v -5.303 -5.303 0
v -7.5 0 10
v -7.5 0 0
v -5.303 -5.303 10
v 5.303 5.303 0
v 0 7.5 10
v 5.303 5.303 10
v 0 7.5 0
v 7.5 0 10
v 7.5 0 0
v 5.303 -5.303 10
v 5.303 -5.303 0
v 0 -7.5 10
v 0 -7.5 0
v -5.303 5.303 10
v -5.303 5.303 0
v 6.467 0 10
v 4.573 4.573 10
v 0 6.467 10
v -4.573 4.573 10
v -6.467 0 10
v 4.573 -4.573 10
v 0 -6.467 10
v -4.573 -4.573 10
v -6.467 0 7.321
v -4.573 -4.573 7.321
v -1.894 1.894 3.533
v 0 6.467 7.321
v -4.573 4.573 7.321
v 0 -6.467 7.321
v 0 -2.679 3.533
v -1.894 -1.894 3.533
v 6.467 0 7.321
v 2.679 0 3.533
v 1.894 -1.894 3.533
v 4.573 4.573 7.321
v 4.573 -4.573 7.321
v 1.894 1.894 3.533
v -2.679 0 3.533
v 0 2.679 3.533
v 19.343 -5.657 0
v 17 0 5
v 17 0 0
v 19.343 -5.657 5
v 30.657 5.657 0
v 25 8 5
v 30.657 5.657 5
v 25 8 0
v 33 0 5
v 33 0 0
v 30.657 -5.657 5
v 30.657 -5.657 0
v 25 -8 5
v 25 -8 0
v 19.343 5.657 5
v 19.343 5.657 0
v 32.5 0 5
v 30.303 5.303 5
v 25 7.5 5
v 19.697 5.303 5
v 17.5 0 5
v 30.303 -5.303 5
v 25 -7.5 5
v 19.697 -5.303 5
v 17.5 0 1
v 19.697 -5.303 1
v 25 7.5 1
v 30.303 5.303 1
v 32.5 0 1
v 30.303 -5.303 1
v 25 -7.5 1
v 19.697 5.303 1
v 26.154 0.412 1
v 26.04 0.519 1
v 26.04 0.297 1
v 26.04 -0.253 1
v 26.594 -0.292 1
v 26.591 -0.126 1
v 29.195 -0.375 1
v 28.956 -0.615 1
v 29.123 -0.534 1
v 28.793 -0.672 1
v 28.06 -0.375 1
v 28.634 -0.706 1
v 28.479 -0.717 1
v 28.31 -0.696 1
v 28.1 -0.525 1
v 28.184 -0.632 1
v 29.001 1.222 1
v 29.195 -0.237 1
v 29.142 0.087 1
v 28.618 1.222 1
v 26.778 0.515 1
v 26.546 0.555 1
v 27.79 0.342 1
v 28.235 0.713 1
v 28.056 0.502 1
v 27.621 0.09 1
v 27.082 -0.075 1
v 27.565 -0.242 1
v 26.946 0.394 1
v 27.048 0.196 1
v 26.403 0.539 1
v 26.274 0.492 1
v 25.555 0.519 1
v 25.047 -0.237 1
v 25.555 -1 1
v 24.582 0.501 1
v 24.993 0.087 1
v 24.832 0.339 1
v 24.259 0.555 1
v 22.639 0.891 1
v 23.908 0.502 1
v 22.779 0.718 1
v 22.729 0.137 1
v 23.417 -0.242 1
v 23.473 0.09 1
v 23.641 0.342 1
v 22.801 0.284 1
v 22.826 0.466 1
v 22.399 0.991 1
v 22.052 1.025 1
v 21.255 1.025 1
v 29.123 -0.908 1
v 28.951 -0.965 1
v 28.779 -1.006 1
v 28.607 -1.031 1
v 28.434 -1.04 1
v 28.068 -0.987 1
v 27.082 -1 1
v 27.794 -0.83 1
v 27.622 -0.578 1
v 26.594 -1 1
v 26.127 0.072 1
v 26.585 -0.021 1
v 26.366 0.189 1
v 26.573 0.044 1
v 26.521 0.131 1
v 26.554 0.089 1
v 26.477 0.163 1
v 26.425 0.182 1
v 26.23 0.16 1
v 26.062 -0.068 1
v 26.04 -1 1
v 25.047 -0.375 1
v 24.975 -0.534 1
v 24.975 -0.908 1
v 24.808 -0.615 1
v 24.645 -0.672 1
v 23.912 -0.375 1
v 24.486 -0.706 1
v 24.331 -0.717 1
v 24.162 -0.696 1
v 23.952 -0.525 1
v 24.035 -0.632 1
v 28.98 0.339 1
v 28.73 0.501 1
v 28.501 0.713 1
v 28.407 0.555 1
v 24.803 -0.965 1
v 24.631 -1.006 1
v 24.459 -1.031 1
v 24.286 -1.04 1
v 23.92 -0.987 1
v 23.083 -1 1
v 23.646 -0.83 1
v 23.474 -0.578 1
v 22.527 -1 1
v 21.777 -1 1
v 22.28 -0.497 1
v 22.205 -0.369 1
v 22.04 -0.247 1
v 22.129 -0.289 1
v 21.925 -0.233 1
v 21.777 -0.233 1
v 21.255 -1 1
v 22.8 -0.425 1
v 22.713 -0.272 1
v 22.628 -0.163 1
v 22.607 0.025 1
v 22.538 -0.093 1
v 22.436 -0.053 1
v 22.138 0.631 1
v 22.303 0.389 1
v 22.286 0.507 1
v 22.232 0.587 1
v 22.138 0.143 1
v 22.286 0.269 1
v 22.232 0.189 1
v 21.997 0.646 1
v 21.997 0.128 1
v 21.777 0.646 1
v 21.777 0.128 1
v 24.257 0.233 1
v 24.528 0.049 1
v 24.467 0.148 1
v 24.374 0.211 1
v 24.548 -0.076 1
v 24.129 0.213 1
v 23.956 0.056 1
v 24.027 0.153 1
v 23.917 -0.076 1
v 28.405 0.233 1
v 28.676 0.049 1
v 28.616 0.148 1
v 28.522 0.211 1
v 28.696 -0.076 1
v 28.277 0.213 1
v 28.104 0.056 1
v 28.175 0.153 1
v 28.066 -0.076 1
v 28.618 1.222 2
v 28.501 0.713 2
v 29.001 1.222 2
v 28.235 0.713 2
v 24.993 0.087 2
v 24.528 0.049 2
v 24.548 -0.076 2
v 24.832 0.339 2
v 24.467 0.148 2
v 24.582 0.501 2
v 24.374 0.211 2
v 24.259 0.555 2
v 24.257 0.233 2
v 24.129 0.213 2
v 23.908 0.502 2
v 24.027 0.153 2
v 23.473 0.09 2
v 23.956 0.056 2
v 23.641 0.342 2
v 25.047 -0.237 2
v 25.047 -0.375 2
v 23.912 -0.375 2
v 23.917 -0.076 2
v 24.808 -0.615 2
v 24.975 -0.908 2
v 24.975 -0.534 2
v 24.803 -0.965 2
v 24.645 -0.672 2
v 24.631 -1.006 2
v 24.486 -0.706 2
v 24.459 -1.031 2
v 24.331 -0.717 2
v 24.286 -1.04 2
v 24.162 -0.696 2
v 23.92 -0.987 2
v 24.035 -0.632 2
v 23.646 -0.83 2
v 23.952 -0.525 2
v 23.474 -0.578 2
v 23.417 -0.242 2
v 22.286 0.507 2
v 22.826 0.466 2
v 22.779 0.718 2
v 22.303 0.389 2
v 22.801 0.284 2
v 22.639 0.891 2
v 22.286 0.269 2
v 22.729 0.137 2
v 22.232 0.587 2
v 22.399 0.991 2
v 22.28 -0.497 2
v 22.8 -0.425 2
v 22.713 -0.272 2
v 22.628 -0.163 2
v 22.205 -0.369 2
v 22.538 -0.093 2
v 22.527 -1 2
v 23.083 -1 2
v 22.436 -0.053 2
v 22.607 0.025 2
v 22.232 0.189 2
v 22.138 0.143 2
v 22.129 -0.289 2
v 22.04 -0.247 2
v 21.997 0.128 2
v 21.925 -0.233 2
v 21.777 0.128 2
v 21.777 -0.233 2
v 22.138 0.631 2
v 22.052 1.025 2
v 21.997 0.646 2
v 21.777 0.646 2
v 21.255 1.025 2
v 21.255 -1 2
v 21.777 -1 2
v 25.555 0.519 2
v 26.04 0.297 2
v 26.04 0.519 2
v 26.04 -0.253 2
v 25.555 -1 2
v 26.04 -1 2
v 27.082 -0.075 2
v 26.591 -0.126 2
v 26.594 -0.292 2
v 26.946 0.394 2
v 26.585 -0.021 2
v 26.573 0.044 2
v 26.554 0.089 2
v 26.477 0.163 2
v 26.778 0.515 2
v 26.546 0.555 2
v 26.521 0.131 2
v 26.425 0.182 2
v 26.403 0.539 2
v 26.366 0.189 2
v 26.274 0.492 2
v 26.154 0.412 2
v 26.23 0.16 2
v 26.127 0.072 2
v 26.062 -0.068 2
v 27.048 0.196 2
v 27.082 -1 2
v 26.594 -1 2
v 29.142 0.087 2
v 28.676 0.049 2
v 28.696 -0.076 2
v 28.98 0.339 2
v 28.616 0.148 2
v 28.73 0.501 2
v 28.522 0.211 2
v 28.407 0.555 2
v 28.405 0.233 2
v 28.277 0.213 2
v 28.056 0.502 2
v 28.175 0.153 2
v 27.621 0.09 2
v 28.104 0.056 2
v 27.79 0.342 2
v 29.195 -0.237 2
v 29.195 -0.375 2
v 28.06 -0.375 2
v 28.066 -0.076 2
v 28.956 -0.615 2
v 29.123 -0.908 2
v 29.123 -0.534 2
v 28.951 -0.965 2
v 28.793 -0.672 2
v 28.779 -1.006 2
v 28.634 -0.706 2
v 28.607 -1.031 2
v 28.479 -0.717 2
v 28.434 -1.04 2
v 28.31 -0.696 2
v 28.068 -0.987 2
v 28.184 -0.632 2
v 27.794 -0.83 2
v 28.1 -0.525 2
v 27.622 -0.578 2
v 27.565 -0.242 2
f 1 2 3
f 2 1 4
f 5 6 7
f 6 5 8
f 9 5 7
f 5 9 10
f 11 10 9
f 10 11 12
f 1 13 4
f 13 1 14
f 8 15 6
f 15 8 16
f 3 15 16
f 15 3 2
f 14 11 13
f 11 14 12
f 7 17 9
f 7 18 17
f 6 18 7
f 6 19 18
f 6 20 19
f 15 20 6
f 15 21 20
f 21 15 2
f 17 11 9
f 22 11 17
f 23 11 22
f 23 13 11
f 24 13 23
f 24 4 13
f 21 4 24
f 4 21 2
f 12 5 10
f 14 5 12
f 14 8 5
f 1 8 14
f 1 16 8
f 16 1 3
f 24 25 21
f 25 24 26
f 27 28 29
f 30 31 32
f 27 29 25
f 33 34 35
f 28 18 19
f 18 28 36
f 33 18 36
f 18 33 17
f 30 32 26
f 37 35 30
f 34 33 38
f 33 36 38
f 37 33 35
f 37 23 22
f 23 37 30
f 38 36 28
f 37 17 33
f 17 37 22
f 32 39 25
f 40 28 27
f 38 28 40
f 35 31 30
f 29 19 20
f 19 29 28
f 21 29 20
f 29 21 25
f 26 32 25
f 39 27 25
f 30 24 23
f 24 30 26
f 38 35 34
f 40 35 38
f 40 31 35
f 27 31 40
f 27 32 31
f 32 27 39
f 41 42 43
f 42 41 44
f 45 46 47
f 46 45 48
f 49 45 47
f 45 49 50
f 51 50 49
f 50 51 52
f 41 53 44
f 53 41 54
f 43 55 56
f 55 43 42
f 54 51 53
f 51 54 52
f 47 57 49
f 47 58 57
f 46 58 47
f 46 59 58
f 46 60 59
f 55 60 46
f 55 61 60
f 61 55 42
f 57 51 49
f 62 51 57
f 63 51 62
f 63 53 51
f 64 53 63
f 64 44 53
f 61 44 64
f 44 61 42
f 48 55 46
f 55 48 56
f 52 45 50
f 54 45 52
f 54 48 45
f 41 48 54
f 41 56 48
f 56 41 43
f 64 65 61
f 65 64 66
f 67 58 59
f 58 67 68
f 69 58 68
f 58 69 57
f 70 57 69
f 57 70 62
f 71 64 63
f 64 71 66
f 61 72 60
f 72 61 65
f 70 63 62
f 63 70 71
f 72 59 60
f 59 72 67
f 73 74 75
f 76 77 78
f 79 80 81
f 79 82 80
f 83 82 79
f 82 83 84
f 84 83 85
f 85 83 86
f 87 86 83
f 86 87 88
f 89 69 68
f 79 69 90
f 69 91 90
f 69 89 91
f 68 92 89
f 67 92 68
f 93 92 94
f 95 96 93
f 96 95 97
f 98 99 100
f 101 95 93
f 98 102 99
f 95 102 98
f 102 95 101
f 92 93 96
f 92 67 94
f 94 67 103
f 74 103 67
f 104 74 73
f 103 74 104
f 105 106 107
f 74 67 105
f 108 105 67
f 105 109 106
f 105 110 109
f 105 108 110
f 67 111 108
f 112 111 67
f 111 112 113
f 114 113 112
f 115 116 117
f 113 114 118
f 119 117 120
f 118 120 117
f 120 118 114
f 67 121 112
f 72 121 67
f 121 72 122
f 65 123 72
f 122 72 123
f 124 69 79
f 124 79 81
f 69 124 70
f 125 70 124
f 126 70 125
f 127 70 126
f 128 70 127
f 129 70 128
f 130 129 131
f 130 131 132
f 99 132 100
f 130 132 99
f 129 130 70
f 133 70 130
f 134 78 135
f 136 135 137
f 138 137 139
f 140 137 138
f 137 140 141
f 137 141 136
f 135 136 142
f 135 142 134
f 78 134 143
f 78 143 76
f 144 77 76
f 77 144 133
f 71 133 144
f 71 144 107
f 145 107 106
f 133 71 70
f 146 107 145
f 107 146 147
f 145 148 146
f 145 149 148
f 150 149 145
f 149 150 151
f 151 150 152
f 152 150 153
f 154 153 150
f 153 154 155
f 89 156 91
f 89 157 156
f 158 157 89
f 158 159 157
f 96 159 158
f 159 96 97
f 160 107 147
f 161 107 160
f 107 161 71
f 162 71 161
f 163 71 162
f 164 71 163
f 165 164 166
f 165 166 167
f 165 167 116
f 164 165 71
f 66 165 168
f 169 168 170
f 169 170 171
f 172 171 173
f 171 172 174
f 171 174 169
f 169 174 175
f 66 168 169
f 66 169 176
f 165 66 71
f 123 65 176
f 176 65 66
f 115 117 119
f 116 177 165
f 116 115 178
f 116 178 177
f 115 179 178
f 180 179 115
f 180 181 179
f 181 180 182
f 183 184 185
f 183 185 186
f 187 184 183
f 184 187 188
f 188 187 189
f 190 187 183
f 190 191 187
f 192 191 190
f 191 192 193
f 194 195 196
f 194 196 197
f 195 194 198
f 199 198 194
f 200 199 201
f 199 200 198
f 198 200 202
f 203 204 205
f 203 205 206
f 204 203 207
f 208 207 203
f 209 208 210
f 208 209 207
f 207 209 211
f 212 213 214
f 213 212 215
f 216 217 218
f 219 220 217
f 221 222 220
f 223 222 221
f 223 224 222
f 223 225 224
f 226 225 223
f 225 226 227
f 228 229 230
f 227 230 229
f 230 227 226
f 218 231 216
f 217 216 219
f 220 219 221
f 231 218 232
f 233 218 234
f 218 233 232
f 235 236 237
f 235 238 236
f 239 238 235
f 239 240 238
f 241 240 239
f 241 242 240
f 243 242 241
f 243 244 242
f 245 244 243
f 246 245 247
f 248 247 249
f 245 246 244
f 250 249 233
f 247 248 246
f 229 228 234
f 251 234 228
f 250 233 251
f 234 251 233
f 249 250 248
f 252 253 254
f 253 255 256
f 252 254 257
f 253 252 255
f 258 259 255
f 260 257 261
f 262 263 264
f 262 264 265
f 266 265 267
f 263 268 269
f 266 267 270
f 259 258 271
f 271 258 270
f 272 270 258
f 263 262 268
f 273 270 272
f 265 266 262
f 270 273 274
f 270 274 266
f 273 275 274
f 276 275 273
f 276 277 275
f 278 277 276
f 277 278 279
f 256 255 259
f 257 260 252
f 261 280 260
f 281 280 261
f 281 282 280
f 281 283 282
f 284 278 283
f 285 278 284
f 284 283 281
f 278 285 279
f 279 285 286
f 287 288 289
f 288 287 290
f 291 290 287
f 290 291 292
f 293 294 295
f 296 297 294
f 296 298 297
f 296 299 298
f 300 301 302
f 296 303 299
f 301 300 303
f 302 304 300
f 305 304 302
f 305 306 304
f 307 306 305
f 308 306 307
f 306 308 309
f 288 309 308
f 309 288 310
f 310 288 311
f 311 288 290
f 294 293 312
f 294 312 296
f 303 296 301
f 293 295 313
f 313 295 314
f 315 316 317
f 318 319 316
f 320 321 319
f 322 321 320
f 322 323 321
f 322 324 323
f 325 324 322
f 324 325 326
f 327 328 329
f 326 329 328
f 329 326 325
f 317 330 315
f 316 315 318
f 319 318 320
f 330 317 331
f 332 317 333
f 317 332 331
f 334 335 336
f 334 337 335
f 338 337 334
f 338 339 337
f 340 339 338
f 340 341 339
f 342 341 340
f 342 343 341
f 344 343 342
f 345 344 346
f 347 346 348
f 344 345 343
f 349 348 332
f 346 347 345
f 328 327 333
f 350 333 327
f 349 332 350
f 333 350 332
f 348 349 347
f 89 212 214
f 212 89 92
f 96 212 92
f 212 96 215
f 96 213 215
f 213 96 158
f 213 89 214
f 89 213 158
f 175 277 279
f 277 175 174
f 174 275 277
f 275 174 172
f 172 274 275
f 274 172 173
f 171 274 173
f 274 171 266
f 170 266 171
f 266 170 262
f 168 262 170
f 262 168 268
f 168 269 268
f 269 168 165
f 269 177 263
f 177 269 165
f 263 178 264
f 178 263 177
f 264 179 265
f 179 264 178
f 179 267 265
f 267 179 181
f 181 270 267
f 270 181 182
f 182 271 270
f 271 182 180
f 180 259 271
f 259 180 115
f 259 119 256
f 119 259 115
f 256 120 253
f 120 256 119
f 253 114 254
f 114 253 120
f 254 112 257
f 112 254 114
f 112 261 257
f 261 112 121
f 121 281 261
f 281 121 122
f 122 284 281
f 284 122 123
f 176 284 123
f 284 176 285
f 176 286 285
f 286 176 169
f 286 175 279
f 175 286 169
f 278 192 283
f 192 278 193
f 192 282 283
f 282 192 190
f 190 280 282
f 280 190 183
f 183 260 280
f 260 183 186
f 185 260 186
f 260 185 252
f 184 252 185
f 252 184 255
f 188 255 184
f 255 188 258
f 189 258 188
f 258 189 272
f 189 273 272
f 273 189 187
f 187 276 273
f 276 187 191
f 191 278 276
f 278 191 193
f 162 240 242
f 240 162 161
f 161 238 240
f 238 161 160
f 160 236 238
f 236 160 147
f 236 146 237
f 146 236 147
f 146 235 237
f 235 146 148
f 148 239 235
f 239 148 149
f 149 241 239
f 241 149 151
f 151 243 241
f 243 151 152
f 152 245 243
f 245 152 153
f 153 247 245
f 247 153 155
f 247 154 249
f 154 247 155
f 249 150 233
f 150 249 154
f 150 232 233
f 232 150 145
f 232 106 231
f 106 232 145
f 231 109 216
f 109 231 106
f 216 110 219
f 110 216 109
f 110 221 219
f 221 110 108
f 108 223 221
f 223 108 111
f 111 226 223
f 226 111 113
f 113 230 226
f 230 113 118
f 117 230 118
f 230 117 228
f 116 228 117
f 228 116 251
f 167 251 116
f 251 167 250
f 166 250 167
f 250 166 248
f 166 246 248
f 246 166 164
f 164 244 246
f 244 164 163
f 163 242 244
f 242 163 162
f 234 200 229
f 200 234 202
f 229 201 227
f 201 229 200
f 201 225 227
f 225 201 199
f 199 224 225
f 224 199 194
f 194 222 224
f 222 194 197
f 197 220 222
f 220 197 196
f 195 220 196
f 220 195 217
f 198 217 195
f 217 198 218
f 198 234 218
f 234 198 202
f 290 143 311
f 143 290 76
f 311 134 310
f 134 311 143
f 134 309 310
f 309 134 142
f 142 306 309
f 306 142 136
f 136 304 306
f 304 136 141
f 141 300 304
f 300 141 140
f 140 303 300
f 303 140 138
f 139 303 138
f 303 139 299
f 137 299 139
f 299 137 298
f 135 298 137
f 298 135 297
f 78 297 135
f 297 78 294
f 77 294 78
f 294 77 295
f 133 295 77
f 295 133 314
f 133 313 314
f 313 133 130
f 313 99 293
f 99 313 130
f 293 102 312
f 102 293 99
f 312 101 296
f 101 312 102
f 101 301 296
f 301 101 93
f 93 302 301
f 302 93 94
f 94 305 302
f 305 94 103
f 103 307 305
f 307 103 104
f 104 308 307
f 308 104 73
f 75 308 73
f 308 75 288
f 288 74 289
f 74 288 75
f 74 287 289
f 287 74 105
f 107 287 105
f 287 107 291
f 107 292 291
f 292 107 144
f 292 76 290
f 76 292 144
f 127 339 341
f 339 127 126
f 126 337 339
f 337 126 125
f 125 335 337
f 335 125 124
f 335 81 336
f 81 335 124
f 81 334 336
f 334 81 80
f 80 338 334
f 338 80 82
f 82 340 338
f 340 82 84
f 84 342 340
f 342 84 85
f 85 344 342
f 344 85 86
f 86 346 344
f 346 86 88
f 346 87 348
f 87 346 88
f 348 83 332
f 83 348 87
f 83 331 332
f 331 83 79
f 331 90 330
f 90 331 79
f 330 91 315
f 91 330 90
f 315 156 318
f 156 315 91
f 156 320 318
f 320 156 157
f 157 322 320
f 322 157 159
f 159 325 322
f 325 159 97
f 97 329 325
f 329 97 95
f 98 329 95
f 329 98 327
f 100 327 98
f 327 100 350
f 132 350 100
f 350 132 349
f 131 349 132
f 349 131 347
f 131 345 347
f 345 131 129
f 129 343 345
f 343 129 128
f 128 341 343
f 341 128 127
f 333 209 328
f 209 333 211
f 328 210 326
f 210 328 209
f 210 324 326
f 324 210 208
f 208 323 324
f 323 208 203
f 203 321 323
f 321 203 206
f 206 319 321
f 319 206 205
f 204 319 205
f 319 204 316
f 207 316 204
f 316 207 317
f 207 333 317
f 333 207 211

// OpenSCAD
/*Caja para labiales de Gaby

Todos los valores en milimietros

https://federico.bitonte.com

*/
//What to print? - Que imprimir
imprimir = "ambas"; //["caja","tapa","ambas"]
//box diameter - diametro de la caja
diametro = 15;
//wall thickness - Grosor de la pared
grosor_pared  = 1;
//box height - Altura de la caja
altura_caja = 10;
// offset between the box and the lid heights - Diferencia de altura entre la caja y la tapa (para poder agarrarla par abrirla)
diferencia_tapa = 5;
//Steps - Pasos (caras de la caja)
$fn = 8; // 
//Box color (only for preview) - Color de la caja
color_caja = "Black";
//Lid color (for preview only) Color de la tapa
color_tapa = "DeepPink";
//text, if any - Texto tapa
texto = "René   ";
//Font - Tipografía
typo = "la chata:style=Bold"; //["la chata:style=Bold", "Ink Free:style=Bold","Verdana:style=Bold", "Maiandra GD MT:style=Bold"]
//Font Size - Tamaño letra
letra_size = 2;
//Text offset pos - Alinear texto (suele ser la mitad del tamaño de la letra multiplicado por la cantidad de letras)
texto_alinear = 4;

module caja(){
    difference(){
        color(color_caja)
        cylinder (r=diametro/2, h = altura_caja);
    
        color ("gray")
        translate ([0,0,(altura_caja)])
        sphere (r=(diametro-grosor_pared)/2);
    }
    color(color_caja)
        cylinder (r=diametro/2, h = grosor_pared);
}

module tapa(){
    difference(){
        color(color_tapa)
        cylinder (r=((diametro+grosor_pared)/2), h = altura_caja-diferencia_tapa);
    
        color (color_tapa)
        translate ([0,0,grosor_pared])
        cylinder (r=((diametro)/2), h = altura_caja-diferencia_tapa);
    }
    
    color(color_tapa)
    translate([-texto_alinear,-letra_size/2,grosor_pared])
    linear_extrude(1)
    text(texto, size=letra_size, direction="ltr", spacing=1.1, font=typo);
}

module print(){
    
    if (imprimir == "caja" || imprimir == "ambas"){
        caja();
    }
    
    if (imprimir == "ambas"){
        translate ([diametro+10,0,0])
        tapa();
    }
    
    if (imprimir == "tapa"){
        //translate ([diametro+10,0,0])
        tapa();
    }
    
}

print();
    
